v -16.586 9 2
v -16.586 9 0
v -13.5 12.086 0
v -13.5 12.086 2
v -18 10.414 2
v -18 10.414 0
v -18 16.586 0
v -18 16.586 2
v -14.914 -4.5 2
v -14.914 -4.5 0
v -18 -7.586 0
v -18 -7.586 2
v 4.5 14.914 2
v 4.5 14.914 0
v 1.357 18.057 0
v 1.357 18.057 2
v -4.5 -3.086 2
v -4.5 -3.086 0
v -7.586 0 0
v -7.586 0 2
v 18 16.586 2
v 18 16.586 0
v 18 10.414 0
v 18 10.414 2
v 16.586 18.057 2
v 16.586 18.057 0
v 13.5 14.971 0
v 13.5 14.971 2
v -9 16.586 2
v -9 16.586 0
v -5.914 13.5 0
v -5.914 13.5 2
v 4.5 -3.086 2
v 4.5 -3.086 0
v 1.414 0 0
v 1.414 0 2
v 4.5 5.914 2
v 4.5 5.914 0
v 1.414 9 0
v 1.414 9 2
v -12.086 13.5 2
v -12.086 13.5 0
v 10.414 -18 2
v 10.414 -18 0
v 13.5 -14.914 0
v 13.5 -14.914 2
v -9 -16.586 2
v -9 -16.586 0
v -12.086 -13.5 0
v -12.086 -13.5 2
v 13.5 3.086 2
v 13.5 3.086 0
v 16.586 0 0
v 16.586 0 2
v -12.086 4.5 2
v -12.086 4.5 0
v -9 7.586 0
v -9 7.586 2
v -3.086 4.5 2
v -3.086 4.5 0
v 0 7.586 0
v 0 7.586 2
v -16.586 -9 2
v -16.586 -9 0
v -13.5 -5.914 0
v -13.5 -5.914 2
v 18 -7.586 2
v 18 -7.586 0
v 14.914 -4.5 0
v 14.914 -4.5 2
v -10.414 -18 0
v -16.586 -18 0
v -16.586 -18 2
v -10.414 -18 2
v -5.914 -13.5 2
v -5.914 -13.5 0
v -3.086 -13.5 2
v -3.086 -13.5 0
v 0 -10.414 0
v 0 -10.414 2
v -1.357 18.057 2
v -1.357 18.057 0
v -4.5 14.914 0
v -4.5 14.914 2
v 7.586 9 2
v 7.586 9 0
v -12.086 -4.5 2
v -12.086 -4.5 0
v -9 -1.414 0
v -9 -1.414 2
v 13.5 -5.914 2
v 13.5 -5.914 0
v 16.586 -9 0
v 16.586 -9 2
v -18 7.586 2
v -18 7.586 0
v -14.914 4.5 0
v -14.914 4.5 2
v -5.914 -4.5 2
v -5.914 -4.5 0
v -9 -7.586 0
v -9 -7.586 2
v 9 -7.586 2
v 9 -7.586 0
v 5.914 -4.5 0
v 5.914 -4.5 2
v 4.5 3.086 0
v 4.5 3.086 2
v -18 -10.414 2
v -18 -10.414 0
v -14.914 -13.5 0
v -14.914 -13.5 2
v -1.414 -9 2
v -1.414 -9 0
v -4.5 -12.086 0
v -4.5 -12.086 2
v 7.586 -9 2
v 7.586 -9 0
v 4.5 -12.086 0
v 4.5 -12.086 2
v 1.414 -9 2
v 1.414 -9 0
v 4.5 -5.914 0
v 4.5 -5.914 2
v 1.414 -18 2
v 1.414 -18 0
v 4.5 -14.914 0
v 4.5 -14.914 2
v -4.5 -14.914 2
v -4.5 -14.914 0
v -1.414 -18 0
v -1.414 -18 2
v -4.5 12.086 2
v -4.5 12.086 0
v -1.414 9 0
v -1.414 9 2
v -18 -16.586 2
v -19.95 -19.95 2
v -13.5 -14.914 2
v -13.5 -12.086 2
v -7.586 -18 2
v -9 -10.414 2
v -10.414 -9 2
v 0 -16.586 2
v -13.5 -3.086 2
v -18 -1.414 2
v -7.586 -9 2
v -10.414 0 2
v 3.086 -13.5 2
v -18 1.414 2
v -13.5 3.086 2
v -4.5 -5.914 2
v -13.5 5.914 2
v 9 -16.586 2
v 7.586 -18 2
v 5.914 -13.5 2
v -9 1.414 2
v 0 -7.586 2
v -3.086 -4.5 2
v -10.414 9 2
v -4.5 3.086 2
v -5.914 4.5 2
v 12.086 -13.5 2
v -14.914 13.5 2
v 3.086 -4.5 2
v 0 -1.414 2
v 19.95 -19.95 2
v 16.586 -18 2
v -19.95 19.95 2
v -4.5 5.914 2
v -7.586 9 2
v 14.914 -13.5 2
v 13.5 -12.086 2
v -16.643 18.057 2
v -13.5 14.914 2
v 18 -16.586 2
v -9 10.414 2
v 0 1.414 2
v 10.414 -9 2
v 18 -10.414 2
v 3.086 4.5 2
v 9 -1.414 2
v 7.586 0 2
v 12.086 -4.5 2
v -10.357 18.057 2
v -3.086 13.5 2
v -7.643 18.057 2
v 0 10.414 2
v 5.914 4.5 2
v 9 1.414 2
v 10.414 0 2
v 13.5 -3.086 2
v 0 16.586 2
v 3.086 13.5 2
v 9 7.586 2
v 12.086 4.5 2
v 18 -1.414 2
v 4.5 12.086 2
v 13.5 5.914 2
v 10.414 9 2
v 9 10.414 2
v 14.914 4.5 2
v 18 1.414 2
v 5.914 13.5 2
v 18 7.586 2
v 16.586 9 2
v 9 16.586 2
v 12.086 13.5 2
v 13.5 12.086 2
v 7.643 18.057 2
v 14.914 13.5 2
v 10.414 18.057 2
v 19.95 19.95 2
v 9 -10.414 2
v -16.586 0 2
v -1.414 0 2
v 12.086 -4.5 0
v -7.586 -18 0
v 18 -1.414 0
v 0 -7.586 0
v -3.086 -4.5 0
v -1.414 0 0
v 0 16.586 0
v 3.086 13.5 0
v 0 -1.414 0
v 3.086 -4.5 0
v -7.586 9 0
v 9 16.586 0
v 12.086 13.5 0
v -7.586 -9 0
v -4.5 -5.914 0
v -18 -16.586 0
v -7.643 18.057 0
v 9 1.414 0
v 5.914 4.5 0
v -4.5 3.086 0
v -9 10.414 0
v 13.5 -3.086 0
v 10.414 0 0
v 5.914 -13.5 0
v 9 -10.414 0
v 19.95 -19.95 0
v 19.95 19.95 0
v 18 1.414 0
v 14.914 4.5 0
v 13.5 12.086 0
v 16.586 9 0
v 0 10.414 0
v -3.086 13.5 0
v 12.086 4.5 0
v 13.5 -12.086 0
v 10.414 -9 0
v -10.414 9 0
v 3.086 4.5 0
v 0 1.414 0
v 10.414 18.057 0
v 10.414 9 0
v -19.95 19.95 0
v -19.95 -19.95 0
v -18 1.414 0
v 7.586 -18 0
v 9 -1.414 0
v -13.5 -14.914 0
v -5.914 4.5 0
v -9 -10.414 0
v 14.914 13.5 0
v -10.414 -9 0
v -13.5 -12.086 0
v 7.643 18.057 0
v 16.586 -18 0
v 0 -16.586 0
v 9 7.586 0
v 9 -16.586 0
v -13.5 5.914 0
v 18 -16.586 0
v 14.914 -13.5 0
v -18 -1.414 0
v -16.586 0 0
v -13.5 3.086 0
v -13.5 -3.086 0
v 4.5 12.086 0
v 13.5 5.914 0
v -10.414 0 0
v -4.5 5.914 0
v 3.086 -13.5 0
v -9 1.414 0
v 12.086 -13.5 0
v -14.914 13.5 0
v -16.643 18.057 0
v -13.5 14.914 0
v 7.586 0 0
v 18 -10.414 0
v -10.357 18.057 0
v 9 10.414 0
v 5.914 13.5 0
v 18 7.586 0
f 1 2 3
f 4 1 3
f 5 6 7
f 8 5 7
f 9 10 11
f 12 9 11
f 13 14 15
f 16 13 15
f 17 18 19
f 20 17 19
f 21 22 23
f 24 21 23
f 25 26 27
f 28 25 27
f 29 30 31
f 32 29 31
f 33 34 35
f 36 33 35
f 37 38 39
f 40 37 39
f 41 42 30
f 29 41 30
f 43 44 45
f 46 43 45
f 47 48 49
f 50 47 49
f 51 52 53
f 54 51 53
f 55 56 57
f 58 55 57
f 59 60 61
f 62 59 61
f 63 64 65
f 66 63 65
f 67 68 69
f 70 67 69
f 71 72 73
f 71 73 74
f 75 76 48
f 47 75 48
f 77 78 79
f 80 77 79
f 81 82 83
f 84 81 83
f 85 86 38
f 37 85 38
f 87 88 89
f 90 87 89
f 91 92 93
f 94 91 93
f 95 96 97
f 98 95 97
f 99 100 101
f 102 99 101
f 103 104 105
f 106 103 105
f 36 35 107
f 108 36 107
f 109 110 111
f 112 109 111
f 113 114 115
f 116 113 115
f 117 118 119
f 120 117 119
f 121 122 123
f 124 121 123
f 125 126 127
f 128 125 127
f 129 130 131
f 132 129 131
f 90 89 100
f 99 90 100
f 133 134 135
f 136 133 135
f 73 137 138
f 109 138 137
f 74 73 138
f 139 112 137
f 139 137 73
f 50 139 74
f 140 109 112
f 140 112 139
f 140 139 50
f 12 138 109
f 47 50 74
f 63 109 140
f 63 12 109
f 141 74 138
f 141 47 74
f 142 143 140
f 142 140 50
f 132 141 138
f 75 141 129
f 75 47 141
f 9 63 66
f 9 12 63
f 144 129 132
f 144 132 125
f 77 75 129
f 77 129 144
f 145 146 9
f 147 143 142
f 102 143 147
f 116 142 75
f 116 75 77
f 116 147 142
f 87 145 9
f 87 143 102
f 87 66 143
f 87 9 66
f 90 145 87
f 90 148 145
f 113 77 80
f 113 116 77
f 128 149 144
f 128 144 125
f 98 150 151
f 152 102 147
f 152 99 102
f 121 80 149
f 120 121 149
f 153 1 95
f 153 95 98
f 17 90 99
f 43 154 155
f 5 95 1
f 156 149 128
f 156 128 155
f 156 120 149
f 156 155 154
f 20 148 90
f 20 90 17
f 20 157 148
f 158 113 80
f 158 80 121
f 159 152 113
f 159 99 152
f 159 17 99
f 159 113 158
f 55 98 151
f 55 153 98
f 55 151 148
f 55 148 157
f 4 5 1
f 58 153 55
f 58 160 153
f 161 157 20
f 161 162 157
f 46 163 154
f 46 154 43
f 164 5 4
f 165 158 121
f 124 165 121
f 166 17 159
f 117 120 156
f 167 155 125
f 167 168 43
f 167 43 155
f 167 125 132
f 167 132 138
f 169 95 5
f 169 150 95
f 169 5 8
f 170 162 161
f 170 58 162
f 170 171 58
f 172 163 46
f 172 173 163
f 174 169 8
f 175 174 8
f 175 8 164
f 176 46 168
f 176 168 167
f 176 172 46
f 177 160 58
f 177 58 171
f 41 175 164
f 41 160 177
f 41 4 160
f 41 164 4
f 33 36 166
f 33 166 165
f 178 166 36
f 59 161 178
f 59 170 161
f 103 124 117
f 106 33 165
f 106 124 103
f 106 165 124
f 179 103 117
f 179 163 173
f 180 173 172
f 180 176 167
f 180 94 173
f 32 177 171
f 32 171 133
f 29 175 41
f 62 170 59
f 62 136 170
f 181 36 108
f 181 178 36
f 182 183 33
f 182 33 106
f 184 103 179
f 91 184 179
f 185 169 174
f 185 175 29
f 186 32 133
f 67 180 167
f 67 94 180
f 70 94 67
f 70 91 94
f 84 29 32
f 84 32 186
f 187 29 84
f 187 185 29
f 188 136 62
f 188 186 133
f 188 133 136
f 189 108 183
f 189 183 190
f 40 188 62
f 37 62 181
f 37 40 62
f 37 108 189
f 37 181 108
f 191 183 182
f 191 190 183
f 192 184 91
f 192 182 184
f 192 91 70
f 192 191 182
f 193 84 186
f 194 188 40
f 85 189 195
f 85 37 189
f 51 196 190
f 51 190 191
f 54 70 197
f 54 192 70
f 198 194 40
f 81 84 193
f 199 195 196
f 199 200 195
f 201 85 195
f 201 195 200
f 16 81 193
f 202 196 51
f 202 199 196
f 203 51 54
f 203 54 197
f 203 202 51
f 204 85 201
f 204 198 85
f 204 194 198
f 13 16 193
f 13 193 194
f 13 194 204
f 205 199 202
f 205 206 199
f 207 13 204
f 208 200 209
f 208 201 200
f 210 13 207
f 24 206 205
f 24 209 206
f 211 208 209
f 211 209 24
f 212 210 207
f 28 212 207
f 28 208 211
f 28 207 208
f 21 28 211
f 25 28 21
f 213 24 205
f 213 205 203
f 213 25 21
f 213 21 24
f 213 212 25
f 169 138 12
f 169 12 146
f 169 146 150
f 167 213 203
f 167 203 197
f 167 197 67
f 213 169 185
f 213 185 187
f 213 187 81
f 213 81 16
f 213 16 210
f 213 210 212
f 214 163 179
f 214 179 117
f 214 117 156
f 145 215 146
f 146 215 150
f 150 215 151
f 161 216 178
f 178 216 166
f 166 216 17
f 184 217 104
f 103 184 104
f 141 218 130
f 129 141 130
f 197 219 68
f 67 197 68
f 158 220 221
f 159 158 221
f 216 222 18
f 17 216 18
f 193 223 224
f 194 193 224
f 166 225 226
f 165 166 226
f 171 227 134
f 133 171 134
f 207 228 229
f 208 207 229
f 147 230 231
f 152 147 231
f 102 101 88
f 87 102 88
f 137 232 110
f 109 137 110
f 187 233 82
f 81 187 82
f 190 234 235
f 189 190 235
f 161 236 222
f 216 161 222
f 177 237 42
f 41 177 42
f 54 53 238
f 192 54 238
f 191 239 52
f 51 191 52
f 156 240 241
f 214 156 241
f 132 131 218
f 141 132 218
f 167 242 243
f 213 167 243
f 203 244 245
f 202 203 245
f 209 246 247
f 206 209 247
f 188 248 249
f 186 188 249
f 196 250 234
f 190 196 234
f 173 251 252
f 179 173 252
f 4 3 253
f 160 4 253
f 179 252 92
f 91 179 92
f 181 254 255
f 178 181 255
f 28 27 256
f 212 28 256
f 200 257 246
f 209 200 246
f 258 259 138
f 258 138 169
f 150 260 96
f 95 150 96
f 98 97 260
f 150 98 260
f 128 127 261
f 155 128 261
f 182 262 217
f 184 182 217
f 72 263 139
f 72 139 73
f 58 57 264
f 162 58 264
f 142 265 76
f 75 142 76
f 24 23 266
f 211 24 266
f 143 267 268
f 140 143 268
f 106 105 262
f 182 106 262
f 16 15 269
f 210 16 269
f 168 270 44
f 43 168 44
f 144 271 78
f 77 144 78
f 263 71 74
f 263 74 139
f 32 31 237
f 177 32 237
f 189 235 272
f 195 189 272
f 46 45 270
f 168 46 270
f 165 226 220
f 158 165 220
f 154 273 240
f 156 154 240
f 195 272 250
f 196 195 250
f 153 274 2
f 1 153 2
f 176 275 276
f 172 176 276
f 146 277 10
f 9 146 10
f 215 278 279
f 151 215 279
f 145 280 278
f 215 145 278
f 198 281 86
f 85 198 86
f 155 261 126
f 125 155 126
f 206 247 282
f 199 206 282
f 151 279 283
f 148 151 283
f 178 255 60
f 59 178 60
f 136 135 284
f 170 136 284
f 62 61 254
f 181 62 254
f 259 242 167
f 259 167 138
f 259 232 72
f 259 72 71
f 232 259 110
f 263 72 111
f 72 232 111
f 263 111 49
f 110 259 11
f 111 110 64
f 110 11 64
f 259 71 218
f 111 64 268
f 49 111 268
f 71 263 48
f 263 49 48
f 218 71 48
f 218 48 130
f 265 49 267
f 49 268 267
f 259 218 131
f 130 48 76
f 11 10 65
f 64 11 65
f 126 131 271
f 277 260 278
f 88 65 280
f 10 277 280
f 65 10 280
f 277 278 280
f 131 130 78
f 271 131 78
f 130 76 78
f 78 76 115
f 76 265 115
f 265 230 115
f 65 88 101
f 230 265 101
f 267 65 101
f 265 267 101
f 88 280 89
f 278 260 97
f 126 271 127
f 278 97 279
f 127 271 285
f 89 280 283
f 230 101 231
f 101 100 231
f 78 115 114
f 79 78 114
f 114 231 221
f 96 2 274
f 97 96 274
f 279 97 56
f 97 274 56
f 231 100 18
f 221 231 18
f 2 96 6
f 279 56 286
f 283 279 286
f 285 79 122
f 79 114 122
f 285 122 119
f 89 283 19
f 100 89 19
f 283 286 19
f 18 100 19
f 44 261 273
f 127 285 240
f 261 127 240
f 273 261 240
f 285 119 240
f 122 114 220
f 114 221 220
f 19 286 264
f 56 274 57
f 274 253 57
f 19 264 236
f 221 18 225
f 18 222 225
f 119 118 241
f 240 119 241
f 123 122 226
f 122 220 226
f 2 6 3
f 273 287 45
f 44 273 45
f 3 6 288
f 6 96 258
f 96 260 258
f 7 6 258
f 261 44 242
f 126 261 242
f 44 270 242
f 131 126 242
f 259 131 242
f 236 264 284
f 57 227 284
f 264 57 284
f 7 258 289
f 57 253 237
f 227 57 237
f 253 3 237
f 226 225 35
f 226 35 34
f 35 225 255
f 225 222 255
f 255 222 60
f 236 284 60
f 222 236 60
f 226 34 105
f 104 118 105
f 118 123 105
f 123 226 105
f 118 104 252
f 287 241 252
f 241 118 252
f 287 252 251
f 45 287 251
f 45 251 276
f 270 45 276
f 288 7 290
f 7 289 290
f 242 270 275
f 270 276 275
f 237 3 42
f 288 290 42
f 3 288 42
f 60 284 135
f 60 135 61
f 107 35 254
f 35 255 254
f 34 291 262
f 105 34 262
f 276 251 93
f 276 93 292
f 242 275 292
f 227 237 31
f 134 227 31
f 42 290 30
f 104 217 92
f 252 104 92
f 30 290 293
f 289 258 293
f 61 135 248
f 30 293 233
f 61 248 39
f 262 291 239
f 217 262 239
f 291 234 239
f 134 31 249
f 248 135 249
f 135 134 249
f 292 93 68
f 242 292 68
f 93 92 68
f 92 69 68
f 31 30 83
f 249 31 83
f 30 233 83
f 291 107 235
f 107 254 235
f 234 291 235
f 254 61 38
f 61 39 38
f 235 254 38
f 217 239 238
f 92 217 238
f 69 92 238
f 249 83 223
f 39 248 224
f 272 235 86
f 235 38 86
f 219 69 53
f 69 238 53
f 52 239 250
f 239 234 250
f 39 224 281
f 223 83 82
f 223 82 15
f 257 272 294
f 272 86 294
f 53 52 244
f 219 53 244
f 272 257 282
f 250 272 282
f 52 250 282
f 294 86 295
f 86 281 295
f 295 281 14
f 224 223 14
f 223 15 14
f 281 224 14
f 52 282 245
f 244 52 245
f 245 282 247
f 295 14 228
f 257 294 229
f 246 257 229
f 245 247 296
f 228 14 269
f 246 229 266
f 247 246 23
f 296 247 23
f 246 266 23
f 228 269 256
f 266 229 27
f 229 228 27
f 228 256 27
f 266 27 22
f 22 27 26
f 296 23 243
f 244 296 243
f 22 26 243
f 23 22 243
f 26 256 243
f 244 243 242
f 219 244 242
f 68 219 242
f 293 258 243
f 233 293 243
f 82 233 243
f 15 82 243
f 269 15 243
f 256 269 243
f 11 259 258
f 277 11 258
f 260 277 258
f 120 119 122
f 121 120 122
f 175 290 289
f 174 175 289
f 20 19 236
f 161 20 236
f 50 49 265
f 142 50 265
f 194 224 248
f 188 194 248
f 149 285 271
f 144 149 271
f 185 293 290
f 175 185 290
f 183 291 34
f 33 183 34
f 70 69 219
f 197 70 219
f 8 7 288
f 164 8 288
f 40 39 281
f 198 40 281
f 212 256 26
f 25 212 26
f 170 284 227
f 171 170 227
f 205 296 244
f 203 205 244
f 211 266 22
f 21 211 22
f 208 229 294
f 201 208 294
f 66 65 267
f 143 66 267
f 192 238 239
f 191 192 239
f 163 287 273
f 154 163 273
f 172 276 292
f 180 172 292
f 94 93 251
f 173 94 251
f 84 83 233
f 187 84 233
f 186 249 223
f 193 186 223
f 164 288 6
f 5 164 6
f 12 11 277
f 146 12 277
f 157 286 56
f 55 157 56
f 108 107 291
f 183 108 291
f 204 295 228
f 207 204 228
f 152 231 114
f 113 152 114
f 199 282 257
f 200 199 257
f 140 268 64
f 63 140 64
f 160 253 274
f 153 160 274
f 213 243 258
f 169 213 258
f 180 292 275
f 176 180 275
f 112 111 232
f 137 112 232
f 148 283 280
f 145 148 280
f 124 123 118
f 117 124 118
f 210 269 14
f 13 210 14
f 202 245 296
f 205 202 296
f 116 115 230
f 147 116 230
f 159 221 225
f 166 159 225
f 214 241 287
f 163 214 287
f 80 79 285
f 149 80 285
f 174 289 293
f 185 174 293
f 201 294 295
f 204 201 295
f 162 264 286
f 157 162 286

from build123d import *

# Parameters (mm, degrees)
SKETCH5_W           = 40
SKETCH5_H           = 40
BOSS_EXTRUDE2_DEPTH = 2
CUT_EXTRUDE1_DEPTH  = 2
CUT_EXTRUDE4_DEPTH  = 2
CUT_EXTRUDE5_DEPTH  = 2
CUT_EXTRUDE6_DEPTH  = 2
CUT_EXTRUDE7_DEPTH  = 2
CUT_EXTRUDE8_DEPTH  = 2
SKETCH6_OUTSIDE_W   = 53.32
SKETCH6_OUTSIDE_H   = 53.32
SKETCH6_OUTSIDE_W_2 = 39.9
SKETCH6_OUTSIDE_H_2 = 39.9
CUT_EXTRUDE9_DEPTH  = 10


with BuildPart() as part:
    # Sketch5 → Boss-Extrude2 (new body)
    with BuildSketch(Plane.XY):
        Rectangle(SKETCH5_W, SKETCH5_H)
    extrude(amount=BOSS_EXTRUDE2_DEPTH)

    # Sketch4 → Cut-Extrude1 (cut)
    with BuildSketch(Plane.XY):
        Polygon((16.585786438, 18.056847711), (10.414213562, 18.056847711), (13.5, 14.971061274), align=None)
        Polygon((18, 10.414213562), (18, 16.585786438), (14.914213562, 13.5), align=None)
    extrude(amount=CUT_EXTRUDE1_DEPTH, mode=Mode.SUBTRACT)

    # Sketch4<5> → Cut-Extrude4 (cut)
    with BuildSketch(Plane.XY):
        Polygon((-13.5, -14.914213562), (-16.585786438, -18), (-10.414213562, -18), align=None)
        Polygon((-13.5, -12.085786438), (-10.414213562, -9), (-13.5, -5.914213562), (-16.585786438, -9), align=None)
        Polygon((-5.914213562, -13.5), (-9, -10.414213562), (-12.085786438, -13.5), (-9, -16.585786438), align=None)
        Polygon((-18, -16.585786438), (-14.914213562, -13.5), (-18, -10.414213562), align=None)
    extrude(amount=CUT_EXTRUDE4_DEPTH, mode=Mode.SUBTRACT)

    # Sketch4<6> → Cut-Extrude5 (cut)
    with BuildSketch(Plane.XY):
        Polygon((13.5, -14.914213562), (10.414213562, -18), (16.585786438, -18), align=None)
        Polygon((3.085786438, -13.5), (0, -10.414213562), (-3.085786438, -13.5), (0, -16.585786438), align=None)
        Polygon((-1.414213562, -18), (-4.5, -14.914213562), (-7.585786438, -18), align=None)
        Polygon((4.5, -5.914213562), (1.414213562, -9), (4.5, -12.085786438), (7.585786438, -9), align=None)
        Polygon((12.085786438, -13.5), (9, -10.414213562), (5.914213562, -13.5), (9, -16.585786438), align=None)
        Polygon((7.585786438, -18), (4.5, -14.914213562), (1.414213562, -18), align=None)
        Polygon((13.5, -5.914213562), (10.414213562, -9), (13.5, -12.085786438), (16.585786438, -9), align=None)
        Polygon((18, -16.585786438), (18, -10.414213562), (14.914213562, -13.5), align=None)
        Polygon((12.085786438, -4.5), (9, -1.414213562), (5.914213562, -4.5), (9, -7.585786438), align=None)
        Polygon((18, -7.585786438), (18, -1.414213562), (14.914213562, -4.5), align=None)
    extrude(amount=CUT_EXTRUDE5_DEPTH, mode=Mode.SUBTRACT)

    # Sketch4<7> → Cut-Extrude6 (cut)
    with BuildSketch(Plane.XY):
        Polygon((-4.5, -5.914213562), (-7.585786438, -9), (-4.5, -12.085786438), (-1.414213562, -9), align=None)
        Polygon((3.085786438, -4.5), (0, -1.414213562), (-3.085786438, -4.5), (0, -7.585786438), align=None)
        Polygon((4.5, 3.085786438), (1.414213562, 0), (4.5, -3.085786438), (7.585786438, 0), align=None)
        Polygon((13.5, 3.085786438), (10.414213562, 0), (13.5, -3.085786438), (16.585786438, 0), align=None)
        Polygon((3.085786438, 4.5), (0, 7.585786438), (-3.085786438, 4.5), (0, 1.414213562), align=None)
        Polygon((4.5, 12.085786438), (1.414213562, 9), (4.5, 5.914213562), (7.585786438, 9), align=None)
        Polygon((12.085786438, 4.5), (9, 7.585786438), (5.914213562, 4.5), (9, 1.414213562), align=None)
        Polygon((13.5, 12.085786438), (10.414213562, 9), (13.5, 5.914213562), (16.585786438, 9), align=None)
        Polygon((18, 1.414213562), (18, 7.585786438), (14.914213562, 4.5), align=None)
        Polygon((3.085786438, 13.5), (0, 16.585786438), (-3.085786438, 13.5), (0, 10.414213562), align=None)
        Polygon((7.642634149, 18.056847711), (1.357365851, 18.056847711), (4.5, 14.914213562), align=None)
        Polygon((12.085786438, 13.5), (9, 16.585786438), (5.914213562, 13.5), (9, 10.414213562), align=None)
    extrude(amount=CUT_EXTRUDE6_DEPTH, mode=Mode.SUBTRACT)

    # Sketch4<9> → Cut-Extrude7 (cut)
    with BuildSketch(Plane.XY):
        Polygon((-9, -7.585786438), (-5.914213562, -4.5), (-9, -1.414213562), (-12.085786438, -4.5), align=None)
        Polygon((-4.5, 3.085786438), (-7.585786438, 0), (-4.5, -3.085786438), (-1.414213562, 0), align=None)
        Polygon((-9, 1.414213562), (-5.914213562, 4.5), (-9, 7.585786438), (-12.085786438, 4.5), align=None)
        Polygon((-18, -7.585786438), (-14.914213562, -4.5), (-18, -1.414213562), align=None)
        Polygon((-13.5, 3.085786438), (-16.585786438, 0), (-13.5, -3.085786438), (-10.414213562, 0), align=None)
        Polygon((-18, 1.414213562), (-14.914213562, 4.5), (-18, 7.585786438), align=None)
    extrude(amount=CUT_EXTRUDE7_DEPTH, mode=Mode.SUBTRACT)

    # Sketch4<10> → Cut-Extrude8 (cut)
    with BuildSketch(Plane.XY):
        Polygon((-10.357365851, 18.056847711), (-16.642634149, 18.056847711), (-13.5, 14.914213562), align=None)
        Polygon((-14.914213562, 13.5), (-18, 16.585786438), (-18, 10.414213562), align=None)
        Polygon((-4.5, 12.085786438), (-7.585786438, 9), (-4.5, 5.914213562), (-1.414213562, 9), align=None)
        Polygon((-9, 10.414213562), (-5.914213562, 13.5), (-9, 16.585786438), (-12.085786438, 13.5), align=None)
        Polygon((-1.357365851, 18.056847711), (-7.642634149, 18.056847711), (-4.5, 14.914213562), align=None)
        Polygon((-13.5, 12.085786438), (-16.585786438, 9), (-13.5, 5.914213562), (-10.414213562, 9), align=None)
    extrude(amount=CUT_EXTRUDE8_DEPTH, mode=Mode.SUBTRACT)

    # Sketch6 outside → Cut-Extrude9 (cut)
    with BuildSketch(Plane(origin=(0, 0, 0), x_dir=(-1, 0, 0), z_dir=(0, 0, -1))):
        Rectangle(SKETCH6_OUTSIDE_W, SKETCH6_OUTSIDE_H)
        Rectangle(SKETCH6_OUTSIDE_W_2, SKETCH6_OUTSIDE_H_2, mode=Mode.SUBTRACT)
    extrude(amount=-CUT_EXTRUDE9_DEPTH, mode=Mode.SUBTRACT)


solid = part.part
